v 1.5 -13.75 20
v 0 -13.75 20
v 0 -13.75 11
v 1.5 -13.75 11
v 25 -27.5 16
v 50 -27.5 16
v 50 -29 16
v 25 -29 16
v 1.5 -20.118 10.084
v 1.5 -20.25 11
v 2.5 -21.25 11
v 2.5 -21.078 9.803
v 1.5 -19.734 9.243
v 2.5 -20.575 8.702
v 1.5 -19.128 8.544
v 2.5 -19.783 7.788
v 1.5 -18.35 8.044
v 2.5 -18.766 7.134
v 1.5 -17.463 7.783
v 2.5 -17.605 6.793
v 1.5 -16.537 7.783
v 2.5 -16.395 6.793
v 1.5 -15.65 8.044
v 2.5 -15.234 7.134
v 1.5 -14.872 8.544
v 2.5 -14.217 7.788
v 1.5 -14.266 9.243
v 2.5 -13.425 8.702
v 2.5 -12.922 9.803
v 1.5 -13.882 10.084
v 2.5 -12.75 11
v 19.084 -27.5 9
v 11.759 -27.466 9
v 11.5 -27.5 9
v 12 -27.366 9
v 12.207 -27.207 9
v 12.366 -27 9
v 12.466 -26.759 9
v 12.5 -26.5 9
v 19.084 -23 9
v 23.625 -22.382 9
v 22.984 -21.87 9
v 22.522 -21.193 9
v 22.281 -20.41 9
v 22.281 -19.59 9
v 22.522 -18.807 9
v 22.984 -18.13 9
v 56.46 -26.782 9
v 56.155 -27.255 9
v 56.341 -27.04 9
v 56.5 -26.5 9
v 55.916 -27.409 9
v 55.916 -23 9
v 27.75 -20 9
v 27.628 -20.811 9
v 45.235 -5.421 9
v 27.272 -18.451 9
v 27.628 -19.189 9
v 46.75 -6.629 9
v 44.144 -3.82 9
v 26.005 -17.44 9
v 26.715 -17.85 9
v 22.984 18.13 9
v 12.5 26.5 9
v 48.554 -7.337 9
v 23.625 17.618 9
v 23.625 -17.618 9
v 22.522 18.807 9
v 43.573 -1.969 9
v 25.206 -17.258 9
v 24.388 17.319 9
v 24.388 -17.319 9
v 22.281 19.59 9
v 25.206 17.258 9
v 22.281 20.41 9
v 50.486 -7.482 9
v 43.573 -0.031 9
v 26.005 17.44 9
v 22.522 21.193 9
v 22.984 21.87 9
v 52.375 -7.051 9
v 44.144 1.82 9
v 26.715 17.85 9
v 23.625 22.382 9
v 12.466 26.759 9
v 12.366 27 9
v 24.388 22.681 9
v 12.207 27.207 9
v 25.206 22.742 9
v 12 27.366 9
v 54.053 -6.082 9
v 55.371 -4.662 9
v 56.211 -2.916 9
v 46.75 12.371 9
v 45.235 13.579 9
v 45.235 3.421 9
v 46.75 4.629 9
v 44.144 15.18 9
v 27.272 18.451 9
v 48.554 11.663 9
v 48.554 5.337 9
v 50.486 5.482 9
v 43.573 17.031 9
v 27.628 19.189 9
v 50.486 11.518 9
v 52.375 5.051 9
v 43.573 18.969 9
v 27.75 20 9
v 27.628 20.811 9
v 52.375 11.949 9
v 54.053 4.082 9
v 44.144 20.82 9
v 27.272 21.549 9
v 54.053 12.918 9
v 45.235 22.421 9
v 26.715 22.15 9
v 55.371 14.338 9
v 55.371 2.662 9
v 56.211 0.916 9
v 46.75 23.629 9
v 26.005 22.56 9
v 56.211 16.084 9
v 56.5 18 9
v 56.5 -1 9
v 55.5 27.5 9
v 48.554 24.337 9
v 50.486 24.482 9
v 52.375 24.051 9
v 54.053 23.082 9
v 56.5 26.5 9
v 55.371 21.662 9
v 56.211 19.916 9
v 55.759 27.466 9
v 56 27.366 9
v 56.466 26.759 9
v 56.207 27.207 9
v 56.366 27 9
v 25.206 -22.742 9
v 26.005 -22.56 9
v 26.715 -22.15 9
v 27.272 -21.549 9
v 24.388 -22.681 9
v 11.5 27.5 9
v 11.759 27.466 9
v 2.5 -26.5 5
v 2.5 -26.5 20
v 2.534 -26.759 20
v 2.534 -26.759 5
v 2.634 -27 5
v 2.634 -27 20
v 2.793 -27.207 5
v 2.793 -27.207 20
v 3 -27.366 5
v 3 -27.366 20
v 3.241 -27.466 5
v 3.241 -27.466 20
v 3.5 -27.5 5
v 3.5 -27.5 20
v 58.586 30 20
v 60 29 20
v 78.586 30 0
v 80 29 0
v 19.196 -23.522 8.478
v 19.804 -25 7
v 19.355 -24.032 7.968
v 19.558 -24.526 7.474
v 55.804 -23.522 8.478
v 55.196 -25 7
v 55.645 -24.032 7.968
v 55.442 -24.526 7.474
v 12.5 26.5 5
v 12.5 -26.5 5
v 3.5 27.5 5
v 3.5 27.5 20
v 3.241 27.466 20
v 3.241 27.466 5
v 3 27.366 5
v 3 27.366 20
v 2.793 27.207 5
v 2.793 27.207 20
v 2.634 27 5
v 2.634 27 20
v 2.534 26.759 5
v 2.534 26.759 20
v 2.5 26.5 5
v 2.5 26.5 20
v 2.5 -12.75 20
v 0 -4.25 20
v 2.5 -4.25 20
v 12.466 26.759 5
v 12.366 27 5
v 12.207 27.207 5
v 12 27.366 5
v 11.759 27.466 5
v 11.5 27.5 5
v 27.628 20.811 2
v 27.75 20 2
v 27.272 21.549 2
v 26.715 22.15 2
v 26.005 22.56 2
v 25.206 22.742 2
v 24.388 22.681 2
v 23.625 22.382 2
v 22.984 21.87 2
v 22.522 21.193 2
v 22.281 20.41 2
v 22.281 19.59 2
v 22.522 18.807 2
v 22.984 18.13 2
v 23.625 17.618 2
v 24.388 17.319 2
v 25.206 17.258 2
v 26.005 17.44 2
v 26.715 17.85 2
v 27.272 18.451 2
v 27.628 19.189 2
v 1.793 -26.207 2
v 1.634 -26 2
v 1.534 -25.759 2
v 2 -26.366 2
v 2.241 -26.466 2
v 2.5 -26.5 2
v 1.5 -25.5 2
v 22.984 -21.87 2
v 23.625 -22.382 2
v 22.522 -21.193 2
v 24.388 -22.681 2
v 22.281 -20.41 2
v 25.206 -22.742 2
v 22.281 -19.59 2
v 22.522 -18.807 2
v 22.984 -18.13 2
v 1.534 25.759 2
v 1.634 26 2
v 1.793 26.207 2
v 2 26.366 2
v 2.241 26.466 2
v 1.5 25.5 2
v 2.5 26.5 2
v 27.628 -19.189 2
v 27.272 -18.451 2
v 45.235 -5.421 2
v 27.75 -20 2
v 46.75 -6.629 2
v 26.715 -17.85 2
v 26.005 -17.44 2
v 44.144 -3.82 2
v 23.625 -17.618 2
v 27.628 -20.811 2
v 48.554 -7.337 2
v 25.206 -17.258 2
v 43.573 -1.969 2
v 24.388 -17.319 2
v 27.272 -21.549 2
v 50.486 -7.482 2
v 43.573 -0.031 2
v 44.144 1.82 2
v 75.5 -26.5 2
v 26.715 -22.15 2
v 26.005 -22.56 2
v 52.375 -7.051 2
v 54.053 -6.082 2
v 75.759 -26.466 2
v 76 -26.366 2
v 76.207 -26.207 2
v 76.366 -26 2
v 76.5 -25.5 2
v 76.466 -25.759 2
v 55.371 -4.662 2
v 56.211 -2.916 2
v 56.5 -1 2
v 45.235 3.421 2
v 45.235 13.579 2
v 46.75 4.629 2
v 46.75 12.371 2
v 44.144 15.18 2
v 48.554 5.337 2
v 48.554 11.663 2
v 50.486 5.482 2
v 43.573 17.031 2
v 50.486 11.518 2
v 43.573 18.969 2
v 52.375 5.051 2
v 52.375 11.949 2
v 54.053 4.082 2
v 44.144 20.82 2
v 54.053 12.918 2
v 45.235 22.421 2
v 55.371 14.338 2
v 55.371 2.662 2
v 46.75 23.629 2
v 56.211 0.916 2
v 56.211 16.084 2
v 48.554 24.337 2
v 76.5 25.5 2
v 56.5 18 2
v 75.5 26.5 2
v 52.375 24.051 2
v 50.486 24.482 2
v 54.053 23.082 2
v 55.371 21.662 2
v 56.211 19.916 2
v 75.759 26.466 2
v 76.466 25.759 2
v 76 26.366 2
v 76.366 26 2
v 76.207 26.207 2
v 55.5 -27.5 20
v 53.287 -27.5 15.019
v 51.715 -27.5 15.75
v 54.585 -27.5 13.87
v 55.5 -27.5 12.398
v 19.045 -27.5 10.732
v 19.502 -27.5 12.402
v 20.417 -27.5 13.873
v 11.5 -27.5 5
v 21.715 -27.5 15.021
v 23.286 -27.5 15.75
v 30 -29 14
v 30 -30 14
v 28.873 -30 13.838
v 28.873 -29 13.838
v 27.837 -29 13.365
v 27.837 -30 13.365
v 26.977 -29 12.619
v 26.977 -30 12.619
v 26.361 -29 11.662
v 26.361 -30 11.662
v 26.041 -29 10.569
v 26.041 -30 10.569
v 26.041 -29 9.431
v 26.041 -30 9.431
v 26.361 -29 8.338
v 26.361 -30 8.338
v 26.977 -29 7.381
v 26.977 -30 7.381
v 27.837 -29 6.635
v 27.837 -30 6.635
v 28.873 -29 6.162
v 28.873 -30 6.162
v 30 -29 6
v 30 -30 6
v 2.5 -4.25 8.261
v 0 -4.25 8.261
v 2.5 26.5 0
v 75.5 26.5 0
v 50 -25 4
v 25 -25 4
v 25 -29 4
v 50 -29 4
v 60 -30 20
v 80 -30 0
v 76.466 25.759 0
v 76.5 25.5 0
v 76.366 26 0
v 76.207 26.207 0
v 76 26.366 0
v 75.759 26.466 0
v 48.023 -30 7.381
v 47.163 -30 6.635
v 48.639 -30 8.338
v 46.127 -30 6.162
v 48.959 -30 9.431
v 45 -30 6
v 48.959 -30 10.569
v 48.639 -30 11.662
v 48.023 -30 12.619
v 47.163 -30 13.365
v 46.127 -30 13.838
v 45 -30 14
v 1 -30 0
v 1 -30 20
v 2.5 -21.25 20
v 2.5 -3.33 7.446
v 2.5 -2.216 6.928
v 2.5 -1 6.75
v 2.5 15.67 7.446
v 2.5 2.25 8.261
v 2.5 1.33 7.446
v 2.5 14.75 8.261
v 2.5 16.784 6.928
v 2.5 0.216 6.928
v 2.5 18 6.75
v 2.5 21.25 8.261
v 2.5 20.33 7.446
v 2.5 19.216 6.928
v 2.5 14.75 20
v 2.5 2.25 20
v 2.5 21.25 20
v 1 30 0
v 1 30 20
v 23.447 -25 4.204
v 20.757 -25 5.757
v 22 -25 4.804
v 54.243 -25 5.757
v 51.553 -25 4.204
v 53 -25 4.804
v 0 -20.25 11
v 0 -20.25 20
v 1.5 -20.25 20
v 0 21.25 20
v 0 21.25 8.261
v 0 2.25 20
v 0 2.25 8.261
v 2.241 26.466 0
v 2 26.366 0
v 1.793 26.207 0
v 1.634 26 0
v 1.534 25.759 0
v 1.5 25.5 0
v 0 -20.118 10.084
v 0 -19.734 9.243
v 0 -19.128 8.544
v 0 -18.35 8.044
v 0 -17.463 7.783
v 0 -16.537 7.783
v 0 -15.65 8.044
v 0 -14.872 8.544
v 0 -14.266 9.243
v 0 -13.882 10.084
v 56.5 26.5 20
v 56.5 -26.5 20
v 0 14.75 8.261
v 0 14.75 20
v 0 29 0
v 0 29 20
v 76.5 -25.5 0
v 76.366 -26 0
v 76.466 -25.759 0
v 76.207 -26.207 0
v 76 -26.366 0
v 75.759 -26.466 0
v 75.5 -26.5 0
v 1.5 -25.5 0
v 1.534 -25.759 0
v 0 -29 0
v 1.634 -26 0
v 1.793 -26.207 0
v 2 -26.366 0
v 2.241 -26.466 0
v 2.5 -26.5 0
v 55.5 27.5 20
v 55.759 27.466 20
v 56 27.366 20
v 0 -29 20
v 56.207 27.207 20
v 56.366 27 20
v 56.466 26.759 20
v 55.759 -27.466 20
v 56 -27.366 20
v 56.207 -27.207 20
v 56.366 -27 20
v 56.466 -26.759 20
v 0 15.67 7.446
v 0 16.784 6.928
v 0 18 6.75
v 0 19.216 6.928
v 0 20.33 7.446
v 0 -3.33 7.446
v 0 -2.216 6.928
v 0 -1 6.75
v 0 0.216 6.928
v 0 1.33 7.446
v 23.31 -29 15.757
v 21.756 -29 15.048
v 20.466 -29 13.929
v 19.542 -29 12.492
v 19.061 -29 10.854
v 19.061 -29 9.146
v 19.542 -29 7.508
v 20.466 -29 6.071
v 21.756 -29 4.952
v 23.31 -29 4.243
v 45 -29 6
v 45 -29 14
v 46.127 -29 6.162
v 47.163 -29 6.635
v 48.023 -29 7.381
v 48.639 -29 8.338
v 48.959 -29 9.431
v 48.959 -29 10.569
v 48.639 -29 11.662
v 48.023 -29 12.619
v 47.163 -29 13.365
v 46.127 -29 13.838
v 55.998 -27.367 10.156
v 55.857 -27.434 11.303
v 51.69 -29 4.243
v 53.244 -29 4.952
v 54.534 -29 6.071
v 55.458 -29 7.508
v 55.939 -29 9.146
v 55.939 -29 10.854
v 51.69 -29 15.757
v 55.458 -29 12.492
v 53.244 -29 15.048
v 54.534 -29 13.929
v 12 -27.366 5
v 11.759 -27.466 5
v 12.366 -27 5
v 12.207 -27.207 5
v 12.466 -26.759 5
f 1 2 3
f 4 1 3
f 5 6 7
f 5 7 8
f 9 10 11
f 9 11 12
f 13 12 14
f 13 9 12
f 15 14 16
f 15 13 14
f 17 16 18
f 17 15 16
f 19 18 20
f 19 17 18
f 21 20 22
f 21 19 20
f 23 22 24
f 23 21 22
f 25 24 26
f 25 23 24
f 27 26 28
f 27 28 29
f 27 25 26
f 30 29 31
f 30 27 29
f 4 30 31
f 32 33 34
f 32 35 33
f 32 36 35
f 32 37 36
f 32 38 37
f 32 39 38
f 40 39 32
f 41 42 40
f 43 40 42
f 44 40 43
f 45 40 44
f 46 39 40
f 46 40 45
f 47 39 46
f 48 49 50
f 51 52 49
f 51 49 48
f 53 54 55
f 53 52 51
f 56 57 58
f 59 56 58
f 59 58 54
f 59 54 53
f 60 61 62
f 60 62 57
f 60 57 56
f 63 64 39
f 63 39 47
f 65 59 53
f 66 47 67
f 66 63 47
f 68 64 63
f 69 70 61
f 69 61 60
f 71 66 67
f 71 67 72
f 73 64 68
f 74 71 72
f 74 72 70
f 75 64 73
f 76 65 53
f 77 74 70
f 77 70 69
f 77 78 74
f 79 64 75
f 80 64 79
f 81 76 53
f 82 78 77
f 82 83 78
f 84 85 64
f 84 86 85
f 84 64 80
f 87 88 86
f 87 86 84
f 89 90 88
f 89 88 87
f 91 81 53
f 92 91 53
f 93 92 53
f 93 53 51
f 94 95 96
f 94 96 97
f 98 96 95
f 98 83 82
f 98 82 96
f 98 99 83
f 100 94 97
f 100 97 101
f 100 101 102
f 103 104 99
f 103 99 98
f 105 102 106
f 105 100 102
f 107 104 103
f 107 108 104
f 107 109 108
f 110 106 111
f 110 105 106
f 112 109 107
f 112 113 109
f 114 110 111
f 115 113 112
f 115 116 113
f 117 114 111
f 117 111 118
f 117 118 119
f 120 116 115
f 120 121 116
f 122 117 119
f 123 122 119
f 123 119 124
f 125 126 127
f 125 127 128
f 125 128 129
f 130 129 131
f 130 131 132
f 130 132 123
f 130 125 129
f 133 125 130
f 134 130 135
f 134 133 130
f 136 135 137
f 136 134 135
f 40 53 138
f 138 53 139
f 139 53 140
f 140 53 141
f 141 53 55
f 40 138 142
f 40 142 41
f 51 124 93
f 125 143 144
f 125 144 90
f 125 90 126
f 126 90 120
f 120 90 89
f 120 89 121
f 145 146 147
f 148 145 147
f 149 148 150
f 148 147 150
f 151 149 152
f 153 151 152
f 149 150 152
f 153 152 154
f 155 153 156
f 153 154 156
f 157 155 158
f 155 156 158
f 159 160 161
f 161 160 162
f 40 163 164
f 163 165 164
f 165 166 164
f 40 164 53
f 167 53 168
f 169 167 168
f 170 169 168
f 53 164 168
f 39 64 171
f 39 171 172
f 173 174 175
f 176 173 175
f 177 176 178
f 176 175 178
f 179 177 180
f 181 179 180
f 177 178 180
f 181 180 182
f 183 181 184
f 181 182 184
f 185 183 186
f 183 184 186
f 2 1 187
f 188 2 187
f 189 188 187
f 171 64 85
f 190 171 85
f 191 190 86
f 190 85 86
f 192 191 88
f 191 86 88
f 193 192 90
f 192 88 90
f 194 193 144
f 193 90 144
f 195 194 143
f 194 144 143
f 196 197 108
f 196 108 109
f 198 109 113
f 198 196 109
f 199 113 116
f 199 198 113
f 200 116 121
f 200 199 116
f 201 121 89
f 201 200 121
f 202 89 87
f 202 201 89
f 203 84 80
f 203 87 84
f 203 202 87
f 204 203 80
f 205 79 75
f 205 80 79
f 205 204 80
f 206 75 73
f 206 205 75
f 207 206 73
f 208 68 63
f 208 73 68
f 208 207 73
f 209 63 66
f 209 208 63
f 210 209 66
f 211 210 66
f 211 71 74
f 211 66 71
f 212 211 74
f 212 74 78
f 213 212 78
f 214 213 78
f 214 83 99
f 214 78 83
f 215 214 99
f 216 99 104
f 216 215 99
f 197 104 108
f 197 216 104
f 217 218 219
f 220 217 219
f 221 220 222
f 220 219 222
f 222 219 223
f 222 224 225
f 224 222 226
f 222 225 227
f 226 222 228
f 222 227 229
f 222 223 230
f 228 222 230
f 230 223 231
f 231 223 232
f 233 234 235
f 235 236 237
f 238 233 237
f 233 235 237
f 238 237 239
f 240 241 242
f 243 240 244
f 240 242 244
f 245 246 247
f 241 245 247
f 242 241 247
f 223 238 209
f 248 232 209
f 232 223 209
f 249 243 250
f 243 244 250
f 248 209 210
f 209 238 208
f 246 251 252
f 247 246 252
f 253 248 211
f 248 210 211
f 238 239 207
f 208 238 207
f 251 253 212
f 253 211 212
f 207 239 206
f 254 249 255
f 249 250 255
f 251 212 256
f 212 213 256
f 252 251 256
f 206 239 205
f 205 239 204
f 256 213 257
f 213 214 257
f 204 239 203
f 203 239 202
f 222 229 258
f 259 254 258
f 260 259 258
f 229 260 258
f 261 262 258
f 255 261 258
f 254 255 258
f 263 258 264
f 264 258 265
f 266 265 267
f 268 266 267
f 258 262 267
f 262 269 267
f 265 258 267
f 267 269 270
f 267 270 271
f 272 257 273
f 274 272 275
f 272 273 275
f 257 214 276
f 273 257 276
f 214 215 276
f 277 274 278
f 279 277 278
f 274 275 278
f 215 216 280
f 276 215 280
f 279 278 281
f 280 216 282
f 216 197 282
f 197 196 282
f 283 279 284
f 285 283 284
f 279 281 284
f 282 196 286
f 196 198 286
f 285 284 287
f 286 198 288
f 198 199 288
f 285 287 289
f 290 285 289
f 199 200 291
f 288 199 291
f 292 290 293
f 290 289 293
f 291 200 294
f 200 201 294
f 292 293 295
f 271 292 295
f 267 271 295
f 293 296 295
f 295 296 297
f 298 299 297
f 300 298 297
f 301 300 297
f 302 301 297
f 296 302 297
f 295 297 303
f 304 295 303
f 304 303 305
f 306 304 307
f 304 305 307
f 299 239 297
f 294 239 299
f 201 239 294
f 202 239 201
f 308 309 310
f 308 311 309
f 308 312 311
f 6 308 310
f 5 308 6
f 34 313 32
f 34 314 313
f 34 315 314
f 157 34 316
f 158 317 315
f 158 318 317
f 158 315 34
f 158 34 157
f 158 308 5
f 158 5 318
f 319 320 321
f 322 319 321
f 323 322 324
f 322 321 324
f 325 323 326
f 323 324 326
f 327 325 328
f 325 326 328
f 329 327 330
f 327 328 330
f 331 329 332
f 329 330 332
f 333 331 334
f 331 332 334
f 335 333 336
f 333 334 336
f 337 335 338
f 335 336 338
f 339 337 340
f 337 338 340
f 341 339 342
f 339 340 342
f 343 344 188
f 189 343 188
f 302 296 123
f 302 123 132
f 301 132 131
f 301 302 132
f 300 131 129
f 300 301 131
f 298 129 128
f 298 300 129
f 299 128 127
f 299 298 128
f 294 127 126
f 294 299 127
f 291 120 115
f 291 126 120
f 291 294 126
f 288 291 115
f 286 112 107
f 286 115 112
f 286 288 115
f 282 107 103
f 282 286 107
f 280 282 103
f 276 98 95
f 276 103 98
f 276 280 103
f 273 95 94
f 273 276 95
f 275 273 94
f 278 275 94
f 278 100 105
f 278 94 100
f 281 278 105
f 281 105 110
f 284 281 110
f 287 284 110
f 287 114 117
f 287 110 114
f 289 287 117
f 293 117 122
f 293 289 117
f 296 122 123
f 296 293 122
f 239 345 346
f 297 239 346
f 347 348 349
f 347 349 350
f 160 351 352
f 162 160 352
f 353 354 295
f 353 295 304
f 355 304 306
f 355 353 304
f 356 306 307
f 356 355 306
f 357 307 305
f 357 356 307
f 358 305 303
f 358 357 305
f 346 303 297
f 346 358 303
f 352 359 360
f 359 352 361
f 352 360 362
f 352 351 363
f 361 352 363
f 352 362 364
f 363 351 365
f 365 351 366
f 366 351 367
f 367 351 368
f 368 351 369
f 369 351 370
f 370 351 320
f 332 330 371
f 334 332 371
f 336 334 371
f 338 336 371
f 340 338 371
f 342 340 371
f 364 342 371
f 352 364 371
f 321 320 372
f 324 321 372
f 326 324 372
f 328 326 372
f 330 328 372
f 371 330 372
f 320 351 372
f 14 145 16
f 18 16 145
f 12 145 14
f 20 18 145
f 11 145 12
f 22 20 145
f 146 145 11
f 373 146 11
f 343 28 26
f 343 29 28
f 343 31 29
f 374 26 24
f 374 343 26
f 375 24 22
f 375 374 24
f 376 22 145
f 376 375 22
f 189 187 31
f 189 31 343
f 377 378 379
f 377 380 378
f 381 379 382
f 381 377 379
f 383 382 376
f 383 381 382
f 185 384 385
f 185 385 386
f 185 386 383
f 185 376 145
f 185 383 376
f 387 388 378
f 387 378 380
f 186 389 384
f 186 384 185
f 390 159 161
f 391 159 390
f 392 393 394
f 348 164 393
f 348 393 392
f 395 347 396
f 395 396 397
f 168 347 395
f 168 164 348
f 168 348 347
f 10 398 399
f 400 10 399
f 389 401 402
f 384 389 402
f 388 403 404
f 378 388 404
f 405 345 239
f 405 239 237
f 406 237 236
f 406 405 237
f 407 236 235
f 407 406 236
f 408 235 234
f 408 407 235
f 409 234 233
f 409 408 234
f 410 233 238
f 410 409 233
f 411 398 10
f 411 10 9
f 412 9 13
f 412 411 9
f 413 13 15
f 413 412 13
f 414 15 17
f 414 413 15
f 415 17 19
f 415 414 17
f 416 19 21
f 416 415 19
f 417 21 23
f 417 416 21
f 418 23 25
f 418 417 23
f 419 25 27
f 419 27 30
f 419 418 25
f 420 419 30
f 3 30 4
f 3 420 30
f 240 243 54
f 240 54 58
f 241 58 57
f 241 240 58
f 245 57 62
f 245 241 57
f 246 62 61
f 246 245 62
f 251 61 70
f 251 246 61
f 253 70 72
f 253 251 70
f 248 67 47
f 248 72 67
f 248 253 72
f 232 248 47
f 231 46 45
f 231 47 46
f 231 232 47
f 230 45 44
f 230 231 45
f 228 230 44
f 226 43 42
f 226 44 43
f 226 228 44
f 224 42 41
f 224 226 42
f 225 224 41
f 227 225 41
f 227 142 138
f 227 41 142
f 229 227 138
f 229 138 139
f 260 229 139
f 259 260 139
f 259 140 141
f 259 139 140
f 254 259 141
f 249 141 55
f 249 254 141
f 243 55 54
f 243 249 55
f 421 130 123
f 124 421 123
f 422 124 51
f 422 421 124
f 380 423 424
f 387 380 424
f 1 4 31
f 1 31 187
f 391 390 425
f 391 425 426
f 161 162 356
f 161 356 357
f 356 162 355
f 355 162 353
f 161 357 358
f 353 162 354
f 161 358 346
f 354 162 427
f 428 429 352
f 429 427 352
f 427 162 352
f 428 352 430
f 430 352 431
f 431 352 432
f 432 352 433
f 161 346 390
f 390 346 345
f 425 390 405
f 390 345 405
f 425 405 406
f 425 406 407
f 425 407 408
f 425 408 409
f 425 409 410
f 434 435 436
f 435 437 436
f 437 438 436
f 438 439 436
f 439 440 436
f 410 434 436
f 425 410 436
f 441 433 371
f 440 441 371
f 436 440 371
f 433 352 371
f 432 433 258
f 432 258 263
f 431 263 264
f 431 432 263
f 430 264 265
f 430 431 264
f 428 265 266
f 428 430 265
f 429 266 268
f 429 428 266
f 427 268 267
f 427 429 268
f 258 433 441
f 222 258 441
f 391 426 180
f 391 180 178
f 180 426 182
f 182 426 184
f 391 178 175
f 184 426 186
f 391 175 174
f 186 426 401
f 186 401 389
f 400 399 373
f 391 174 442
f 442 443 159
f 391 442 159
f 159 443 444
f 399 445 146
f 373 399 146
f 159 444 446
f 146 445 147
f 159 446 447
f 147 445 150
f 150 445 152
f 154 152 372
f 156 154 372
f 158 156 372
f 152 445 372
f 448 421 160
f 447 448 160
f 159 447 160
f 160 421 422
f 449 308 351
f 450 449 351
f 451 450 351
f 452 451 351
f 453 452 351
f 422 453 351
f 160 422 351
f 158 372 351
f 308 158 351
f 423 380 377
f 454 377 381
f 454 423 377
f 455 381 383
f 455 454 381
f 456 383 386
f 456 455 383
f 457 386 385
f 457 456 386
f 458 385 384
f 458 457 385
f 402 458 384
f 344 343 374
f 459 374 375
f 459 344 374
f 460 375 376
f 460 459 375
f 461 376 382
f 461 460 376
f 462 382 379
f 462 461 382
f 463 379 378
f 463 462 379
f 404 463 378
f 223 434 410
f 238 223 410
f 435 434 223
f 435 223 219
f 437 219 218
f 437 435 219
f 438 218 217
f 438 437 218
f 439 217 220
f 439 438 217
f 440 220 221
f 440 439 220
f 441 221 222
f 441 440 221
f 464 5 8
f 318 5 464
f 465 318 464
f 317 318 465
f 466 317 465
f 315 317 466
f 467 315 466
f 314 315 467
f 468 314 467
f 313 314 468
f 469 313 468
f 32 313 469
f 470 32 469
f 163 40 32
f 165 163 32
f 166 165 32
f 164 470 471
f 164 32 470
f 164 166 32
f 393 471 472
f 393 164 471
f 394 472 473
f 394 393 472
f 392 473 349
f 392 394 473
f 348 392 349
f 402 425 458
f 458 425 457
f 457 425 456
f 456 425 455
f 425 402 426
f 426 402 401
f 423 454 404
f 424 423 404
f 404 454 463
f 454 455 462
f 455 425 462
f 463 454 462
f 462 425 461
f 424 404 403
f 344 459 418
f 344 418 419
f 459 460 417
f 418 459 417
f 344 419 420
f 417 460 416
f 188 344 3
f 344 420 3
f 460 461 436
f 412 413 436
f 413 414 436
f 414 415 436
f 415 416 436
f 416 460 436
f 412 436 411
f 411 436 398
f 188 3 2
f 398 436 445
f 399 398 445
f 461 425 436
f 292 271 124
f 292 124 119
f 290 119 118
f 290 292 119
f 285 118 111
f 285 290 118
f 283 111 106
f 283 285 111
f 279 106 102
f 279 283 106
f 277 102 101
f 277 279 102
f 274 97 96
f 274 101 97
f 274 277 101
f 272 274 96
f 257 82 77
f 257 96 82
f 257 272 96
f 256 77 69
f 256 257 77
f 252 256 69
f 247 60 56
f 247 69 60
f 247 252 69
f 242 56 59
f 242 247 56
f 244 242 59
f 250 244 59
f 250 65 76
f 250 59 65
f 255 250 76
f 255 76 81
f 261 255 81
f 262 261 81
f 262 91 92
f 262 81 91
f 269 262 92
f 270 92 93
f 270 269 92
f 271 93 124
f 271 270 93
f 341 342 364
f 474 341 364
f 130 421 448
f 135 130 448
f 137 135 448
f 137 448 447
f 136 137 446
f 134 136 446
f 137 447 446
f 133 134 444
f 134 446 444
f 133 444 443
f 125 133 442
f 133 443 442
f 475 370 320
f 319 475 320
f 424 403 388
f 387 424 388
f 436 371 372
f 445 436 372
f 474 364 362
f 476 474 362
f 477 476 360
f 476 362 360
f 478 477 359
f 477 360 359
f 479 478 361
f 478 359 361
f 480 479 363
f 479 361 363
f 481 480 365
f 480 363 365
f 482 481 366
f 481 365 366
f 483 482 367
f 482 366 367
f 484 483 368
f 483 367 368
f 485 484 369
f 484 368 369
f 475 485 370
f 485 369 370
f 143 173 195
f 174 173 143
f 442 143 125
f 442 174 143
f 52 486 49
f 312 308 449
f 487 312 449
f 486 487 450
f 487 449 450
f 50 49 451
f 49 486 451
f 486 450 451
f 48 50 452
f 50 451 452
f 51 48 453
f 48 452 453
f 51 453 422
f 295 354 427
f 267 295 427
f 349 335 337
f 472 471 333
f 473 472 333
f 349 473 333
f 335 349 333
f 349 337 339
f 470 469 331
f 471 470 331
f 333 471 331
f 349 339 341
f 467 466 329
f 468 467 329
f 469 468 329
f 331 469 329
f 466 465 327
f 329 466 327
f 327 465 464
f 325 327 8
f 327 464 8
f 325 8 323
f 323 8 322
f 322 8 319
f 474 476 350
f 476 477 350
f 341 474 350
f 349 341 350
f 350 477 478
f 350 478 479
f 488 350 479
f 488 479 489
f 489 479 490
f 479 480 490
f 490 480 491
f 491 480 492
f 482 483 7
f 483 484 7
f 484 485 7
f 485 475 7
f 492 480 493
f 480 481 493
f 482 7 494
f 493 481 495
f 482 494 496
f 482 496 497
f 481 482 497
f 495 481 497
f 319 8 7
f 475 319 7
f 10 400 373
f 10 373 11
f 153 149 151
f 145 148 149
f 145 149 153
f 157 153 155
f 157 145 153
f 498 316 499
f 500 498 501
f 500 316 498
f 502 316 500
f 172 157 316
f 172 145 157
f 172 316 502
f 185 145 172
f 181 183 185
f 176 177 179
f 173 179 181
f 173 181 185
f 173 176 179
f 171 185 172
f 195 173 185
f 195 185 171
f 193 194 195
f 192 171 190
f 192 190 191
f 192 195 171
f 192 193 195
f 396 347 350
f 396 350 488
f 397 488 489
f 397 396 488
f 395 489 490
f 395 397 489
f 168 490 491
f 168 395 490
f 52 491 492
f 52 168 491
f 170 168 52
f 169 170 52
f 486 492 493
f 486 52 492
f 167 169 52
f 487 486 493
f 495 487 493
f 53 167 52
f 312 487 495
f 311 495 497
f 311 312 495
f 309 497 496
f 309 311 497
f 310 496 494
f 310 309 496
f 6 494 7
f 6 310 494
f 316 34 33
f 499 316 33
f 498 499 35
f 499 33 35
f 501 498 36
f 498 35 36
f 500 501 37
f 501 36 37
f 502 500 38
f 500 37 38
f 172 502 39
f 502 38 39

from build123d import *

# Parameters (mm, degrees)
PAD_DEPTH       = 30
SKETCH001_R     = 2.75
SKETCH001_R_2   = 6.5
POCKET_DEPTH    = 20.001
POCKET002_DEPTH = 11
POCKET003_DEPTH = 15
POCKET004_DEPTH = 2
POCKET005_DEPTH = 5
POCKET006_DEPTH = 5
POCKET007_DEPTH = 4
CHAMFER_SIZE    = 1
CHAMFER004_SIZE = 2


with BuildPart() as part:
    # Sketch → Pad (new body, symmetric)
    with BuildSketch(Plane.XZ):
        Polygon((0, 0), (0, 20), (60, 20), (80, 0), align=None)
    extrude(amount=PAD_DEPTH, both=True)

    # Sketch001 → Pocket (cut, through all)
    with BuildSketch(Plane.XY):
        with Locations((25, 20)):
            Circle(SKETCH001_R)
        with Locations((25, -20)):
            Circle(SKETCH001_R)
        with Locations((50, 18)):
            Circle(SKETCH001_R_2)
        with Locations((50, -1)):
            Circle(SKETCH001_R_2)
    extrude(amount=POCKET_DEPTH, mode=Mode.SUBTRACT)

    # Sketch003 → Pocket002 (cut)
    with BuildSketch(Plane.XY.offset(20)):
        with BuildLine():
            ThreePointArc((56.5, 26.5), (56.207107, 27.207107), (55.5, 27.5))
            Line((3.5, 27.5), (55.5, 27.5))
            ThreePointArc((3.5, 27.5), (2.792893, 27.207107), (2.5, 26.5))
            Line((2.5, -26.5), (2.5, 26.5))
            ThreePointArc((2.5, -26.5), (2.792893, -27.207107), (3.5, -27.5))
            Line((55.5, -27.5), (3.5, -27.5))
            ThreePointArc((55.5, -27.5), (56.207107, -27.207107), (56.5, -26.5))
            Line((56.5, 26.5), (56.5, -26.5))
        make_face()
    extrude(amount=-POCKET002_DEPTH, mode=Mode.SUBTRACT)

    # Sketch004 → Pocket003 (cut)
    with BuildSketch(Plane.XY.offset(20)):
        with BuildLine():
            ThreePointArc((3.5, 27.5), (2.792893, 27.207107), (2.5, 26.5))
            Line((2.5, -26.5), (2.5, 26.5))
            ThreePointArc((2.5, -26.5), (2.792893, -27.207107), (3.5, -27.5))
            Line((11.5, -27.5), (3.5, -27.5))
            ThreePointArc((11.5, -27.5), (12.207107, -27.207107), (12.5, -26.5))
            Line((12.5, 26.5), (12.5, -26.5))
            ThreePointArc((12.5, 26.5), (12.207107, 27.207107), (11.5, 27.5))
            Line((3.5, 27.5), (11.5, 27.5))
        make_face()
    extrude(amount=-POCKET003_DEPTH, mode=Mode.SUBTRACT)

    # Sketch005 → Pocket004 (cut)
    with BuildSketch(Plane.XY):
        with BuildLine():
            ThreePointArc((2.5, 26.5), (1.792893, 26.207107), (1.5, 25.5))
            Line((1.5, -25.5), (1.5, 25.5))
            ThreePointArc((1.5, -25.5), (1.792893, -26.207107), (2.5, -26.5))
            Line((75.5, -26.5), (2.5, -26.5))
            ThreePointArc((75.5, -26.5), (76.207107, -26.207107), (76.5, -25.5))
            Line((76.5, 25.5), (76.5, -25.5))
            ThreePointArc((76.5, 25.5), (76.207107, 26.207107), (75.5, 26.5))
            Line((2.5, 26.5), (75.5, 26.5))
        make_face()
    extrude(amount=POCKET004_DEPTH, mode=Mode.SUBTRACT)

    # Sketch006 → Pocket005 (cut)
    with BuildSketch(Plane.YZ):
        with BuildLine():
            ThreePointArc((-4.25, 8.261387), (-1, 6.75), (2.25, 8.261387))
            Line((2.25, 21), (2.25, 8.261387))
            Line((-4.25, 21), (2.25, 21))
            Line((-4.25, 8.261387), (-4.25, 21))
        make_face()
        with BuildLine():
            ThreePointArc((14.75, 8.261387), (18, 6.75), (21.25, 8.261387))
            Line((21.25, 21), (21.25, 8.261387))
            Line((14.75, 21), (21.25, 21))
            Line((14.75, 8.261387), (14.75, 21))
        make_face()
        with BuildLine():
            ThreePointArc((-20.25, 11), (-17, 7.75), (-13.75, 11))
            Line((-13.75, 21), (-13.75, 11))
            Line((-20.25, 21), (-13.75, 21))
            Line((-20.25, 11), (-20.25, 21))
        make_face()
    extrude(amount=POCKET005_DEPTH, mode=Mode.SUBTRACT)

    # Sketch007 → Pocket006 (cut)
    with BuildSketch(Plane.XZ.offset(30)):
        with BuildLine():
            ThreePointArc((30, 14), (26, 10), (30, 6))
            Line((30, 6), (45, 6))
            ThreePointArc((45, 6), (49, 10), (45, 14))
            Line((45, 14), (30, 14))
        make_face()
    extrude(amount=-POCKET006_DEPTH, mode=Mode.SUBTRACT)

    # Sketch009 → Pocket007 (cut)
    with BuildSketch(Plane.XZ.offset(25)):
        with BuildLine():
            ThreePointArc((25, 16), (19, 10), (25, 4))
            Line((25, 4), (50, 4))
            ThreePointArc((50, 4), (56, 10), (50, 16))
            Line((50, 16), (25, 16))
        make_face()
    extrude(amount=POCKET007_DEPTH, mode=Mode.SUBTRACT)

    # Chamfer
    chamfer_edges = [part.edges().sort_by_distance(p)[0] for p in [
        (0, -30, 10),
        (0, 30, 10),
        (2.5, -20.25, 15.5),
        (70, 30, 10),
    ]]
    chamfer(chamfer_edges, length=CHAMFER_SIZE)

    # Chamfer004
    chamfer004_edges = [part.edges().sort_by_distance(p)[0] for p in [
        (37.5, -25, 9),
    ]]
    chamfer(chamfer004_edges, length=CHAMFER004_SIZE)


solid = part.part
